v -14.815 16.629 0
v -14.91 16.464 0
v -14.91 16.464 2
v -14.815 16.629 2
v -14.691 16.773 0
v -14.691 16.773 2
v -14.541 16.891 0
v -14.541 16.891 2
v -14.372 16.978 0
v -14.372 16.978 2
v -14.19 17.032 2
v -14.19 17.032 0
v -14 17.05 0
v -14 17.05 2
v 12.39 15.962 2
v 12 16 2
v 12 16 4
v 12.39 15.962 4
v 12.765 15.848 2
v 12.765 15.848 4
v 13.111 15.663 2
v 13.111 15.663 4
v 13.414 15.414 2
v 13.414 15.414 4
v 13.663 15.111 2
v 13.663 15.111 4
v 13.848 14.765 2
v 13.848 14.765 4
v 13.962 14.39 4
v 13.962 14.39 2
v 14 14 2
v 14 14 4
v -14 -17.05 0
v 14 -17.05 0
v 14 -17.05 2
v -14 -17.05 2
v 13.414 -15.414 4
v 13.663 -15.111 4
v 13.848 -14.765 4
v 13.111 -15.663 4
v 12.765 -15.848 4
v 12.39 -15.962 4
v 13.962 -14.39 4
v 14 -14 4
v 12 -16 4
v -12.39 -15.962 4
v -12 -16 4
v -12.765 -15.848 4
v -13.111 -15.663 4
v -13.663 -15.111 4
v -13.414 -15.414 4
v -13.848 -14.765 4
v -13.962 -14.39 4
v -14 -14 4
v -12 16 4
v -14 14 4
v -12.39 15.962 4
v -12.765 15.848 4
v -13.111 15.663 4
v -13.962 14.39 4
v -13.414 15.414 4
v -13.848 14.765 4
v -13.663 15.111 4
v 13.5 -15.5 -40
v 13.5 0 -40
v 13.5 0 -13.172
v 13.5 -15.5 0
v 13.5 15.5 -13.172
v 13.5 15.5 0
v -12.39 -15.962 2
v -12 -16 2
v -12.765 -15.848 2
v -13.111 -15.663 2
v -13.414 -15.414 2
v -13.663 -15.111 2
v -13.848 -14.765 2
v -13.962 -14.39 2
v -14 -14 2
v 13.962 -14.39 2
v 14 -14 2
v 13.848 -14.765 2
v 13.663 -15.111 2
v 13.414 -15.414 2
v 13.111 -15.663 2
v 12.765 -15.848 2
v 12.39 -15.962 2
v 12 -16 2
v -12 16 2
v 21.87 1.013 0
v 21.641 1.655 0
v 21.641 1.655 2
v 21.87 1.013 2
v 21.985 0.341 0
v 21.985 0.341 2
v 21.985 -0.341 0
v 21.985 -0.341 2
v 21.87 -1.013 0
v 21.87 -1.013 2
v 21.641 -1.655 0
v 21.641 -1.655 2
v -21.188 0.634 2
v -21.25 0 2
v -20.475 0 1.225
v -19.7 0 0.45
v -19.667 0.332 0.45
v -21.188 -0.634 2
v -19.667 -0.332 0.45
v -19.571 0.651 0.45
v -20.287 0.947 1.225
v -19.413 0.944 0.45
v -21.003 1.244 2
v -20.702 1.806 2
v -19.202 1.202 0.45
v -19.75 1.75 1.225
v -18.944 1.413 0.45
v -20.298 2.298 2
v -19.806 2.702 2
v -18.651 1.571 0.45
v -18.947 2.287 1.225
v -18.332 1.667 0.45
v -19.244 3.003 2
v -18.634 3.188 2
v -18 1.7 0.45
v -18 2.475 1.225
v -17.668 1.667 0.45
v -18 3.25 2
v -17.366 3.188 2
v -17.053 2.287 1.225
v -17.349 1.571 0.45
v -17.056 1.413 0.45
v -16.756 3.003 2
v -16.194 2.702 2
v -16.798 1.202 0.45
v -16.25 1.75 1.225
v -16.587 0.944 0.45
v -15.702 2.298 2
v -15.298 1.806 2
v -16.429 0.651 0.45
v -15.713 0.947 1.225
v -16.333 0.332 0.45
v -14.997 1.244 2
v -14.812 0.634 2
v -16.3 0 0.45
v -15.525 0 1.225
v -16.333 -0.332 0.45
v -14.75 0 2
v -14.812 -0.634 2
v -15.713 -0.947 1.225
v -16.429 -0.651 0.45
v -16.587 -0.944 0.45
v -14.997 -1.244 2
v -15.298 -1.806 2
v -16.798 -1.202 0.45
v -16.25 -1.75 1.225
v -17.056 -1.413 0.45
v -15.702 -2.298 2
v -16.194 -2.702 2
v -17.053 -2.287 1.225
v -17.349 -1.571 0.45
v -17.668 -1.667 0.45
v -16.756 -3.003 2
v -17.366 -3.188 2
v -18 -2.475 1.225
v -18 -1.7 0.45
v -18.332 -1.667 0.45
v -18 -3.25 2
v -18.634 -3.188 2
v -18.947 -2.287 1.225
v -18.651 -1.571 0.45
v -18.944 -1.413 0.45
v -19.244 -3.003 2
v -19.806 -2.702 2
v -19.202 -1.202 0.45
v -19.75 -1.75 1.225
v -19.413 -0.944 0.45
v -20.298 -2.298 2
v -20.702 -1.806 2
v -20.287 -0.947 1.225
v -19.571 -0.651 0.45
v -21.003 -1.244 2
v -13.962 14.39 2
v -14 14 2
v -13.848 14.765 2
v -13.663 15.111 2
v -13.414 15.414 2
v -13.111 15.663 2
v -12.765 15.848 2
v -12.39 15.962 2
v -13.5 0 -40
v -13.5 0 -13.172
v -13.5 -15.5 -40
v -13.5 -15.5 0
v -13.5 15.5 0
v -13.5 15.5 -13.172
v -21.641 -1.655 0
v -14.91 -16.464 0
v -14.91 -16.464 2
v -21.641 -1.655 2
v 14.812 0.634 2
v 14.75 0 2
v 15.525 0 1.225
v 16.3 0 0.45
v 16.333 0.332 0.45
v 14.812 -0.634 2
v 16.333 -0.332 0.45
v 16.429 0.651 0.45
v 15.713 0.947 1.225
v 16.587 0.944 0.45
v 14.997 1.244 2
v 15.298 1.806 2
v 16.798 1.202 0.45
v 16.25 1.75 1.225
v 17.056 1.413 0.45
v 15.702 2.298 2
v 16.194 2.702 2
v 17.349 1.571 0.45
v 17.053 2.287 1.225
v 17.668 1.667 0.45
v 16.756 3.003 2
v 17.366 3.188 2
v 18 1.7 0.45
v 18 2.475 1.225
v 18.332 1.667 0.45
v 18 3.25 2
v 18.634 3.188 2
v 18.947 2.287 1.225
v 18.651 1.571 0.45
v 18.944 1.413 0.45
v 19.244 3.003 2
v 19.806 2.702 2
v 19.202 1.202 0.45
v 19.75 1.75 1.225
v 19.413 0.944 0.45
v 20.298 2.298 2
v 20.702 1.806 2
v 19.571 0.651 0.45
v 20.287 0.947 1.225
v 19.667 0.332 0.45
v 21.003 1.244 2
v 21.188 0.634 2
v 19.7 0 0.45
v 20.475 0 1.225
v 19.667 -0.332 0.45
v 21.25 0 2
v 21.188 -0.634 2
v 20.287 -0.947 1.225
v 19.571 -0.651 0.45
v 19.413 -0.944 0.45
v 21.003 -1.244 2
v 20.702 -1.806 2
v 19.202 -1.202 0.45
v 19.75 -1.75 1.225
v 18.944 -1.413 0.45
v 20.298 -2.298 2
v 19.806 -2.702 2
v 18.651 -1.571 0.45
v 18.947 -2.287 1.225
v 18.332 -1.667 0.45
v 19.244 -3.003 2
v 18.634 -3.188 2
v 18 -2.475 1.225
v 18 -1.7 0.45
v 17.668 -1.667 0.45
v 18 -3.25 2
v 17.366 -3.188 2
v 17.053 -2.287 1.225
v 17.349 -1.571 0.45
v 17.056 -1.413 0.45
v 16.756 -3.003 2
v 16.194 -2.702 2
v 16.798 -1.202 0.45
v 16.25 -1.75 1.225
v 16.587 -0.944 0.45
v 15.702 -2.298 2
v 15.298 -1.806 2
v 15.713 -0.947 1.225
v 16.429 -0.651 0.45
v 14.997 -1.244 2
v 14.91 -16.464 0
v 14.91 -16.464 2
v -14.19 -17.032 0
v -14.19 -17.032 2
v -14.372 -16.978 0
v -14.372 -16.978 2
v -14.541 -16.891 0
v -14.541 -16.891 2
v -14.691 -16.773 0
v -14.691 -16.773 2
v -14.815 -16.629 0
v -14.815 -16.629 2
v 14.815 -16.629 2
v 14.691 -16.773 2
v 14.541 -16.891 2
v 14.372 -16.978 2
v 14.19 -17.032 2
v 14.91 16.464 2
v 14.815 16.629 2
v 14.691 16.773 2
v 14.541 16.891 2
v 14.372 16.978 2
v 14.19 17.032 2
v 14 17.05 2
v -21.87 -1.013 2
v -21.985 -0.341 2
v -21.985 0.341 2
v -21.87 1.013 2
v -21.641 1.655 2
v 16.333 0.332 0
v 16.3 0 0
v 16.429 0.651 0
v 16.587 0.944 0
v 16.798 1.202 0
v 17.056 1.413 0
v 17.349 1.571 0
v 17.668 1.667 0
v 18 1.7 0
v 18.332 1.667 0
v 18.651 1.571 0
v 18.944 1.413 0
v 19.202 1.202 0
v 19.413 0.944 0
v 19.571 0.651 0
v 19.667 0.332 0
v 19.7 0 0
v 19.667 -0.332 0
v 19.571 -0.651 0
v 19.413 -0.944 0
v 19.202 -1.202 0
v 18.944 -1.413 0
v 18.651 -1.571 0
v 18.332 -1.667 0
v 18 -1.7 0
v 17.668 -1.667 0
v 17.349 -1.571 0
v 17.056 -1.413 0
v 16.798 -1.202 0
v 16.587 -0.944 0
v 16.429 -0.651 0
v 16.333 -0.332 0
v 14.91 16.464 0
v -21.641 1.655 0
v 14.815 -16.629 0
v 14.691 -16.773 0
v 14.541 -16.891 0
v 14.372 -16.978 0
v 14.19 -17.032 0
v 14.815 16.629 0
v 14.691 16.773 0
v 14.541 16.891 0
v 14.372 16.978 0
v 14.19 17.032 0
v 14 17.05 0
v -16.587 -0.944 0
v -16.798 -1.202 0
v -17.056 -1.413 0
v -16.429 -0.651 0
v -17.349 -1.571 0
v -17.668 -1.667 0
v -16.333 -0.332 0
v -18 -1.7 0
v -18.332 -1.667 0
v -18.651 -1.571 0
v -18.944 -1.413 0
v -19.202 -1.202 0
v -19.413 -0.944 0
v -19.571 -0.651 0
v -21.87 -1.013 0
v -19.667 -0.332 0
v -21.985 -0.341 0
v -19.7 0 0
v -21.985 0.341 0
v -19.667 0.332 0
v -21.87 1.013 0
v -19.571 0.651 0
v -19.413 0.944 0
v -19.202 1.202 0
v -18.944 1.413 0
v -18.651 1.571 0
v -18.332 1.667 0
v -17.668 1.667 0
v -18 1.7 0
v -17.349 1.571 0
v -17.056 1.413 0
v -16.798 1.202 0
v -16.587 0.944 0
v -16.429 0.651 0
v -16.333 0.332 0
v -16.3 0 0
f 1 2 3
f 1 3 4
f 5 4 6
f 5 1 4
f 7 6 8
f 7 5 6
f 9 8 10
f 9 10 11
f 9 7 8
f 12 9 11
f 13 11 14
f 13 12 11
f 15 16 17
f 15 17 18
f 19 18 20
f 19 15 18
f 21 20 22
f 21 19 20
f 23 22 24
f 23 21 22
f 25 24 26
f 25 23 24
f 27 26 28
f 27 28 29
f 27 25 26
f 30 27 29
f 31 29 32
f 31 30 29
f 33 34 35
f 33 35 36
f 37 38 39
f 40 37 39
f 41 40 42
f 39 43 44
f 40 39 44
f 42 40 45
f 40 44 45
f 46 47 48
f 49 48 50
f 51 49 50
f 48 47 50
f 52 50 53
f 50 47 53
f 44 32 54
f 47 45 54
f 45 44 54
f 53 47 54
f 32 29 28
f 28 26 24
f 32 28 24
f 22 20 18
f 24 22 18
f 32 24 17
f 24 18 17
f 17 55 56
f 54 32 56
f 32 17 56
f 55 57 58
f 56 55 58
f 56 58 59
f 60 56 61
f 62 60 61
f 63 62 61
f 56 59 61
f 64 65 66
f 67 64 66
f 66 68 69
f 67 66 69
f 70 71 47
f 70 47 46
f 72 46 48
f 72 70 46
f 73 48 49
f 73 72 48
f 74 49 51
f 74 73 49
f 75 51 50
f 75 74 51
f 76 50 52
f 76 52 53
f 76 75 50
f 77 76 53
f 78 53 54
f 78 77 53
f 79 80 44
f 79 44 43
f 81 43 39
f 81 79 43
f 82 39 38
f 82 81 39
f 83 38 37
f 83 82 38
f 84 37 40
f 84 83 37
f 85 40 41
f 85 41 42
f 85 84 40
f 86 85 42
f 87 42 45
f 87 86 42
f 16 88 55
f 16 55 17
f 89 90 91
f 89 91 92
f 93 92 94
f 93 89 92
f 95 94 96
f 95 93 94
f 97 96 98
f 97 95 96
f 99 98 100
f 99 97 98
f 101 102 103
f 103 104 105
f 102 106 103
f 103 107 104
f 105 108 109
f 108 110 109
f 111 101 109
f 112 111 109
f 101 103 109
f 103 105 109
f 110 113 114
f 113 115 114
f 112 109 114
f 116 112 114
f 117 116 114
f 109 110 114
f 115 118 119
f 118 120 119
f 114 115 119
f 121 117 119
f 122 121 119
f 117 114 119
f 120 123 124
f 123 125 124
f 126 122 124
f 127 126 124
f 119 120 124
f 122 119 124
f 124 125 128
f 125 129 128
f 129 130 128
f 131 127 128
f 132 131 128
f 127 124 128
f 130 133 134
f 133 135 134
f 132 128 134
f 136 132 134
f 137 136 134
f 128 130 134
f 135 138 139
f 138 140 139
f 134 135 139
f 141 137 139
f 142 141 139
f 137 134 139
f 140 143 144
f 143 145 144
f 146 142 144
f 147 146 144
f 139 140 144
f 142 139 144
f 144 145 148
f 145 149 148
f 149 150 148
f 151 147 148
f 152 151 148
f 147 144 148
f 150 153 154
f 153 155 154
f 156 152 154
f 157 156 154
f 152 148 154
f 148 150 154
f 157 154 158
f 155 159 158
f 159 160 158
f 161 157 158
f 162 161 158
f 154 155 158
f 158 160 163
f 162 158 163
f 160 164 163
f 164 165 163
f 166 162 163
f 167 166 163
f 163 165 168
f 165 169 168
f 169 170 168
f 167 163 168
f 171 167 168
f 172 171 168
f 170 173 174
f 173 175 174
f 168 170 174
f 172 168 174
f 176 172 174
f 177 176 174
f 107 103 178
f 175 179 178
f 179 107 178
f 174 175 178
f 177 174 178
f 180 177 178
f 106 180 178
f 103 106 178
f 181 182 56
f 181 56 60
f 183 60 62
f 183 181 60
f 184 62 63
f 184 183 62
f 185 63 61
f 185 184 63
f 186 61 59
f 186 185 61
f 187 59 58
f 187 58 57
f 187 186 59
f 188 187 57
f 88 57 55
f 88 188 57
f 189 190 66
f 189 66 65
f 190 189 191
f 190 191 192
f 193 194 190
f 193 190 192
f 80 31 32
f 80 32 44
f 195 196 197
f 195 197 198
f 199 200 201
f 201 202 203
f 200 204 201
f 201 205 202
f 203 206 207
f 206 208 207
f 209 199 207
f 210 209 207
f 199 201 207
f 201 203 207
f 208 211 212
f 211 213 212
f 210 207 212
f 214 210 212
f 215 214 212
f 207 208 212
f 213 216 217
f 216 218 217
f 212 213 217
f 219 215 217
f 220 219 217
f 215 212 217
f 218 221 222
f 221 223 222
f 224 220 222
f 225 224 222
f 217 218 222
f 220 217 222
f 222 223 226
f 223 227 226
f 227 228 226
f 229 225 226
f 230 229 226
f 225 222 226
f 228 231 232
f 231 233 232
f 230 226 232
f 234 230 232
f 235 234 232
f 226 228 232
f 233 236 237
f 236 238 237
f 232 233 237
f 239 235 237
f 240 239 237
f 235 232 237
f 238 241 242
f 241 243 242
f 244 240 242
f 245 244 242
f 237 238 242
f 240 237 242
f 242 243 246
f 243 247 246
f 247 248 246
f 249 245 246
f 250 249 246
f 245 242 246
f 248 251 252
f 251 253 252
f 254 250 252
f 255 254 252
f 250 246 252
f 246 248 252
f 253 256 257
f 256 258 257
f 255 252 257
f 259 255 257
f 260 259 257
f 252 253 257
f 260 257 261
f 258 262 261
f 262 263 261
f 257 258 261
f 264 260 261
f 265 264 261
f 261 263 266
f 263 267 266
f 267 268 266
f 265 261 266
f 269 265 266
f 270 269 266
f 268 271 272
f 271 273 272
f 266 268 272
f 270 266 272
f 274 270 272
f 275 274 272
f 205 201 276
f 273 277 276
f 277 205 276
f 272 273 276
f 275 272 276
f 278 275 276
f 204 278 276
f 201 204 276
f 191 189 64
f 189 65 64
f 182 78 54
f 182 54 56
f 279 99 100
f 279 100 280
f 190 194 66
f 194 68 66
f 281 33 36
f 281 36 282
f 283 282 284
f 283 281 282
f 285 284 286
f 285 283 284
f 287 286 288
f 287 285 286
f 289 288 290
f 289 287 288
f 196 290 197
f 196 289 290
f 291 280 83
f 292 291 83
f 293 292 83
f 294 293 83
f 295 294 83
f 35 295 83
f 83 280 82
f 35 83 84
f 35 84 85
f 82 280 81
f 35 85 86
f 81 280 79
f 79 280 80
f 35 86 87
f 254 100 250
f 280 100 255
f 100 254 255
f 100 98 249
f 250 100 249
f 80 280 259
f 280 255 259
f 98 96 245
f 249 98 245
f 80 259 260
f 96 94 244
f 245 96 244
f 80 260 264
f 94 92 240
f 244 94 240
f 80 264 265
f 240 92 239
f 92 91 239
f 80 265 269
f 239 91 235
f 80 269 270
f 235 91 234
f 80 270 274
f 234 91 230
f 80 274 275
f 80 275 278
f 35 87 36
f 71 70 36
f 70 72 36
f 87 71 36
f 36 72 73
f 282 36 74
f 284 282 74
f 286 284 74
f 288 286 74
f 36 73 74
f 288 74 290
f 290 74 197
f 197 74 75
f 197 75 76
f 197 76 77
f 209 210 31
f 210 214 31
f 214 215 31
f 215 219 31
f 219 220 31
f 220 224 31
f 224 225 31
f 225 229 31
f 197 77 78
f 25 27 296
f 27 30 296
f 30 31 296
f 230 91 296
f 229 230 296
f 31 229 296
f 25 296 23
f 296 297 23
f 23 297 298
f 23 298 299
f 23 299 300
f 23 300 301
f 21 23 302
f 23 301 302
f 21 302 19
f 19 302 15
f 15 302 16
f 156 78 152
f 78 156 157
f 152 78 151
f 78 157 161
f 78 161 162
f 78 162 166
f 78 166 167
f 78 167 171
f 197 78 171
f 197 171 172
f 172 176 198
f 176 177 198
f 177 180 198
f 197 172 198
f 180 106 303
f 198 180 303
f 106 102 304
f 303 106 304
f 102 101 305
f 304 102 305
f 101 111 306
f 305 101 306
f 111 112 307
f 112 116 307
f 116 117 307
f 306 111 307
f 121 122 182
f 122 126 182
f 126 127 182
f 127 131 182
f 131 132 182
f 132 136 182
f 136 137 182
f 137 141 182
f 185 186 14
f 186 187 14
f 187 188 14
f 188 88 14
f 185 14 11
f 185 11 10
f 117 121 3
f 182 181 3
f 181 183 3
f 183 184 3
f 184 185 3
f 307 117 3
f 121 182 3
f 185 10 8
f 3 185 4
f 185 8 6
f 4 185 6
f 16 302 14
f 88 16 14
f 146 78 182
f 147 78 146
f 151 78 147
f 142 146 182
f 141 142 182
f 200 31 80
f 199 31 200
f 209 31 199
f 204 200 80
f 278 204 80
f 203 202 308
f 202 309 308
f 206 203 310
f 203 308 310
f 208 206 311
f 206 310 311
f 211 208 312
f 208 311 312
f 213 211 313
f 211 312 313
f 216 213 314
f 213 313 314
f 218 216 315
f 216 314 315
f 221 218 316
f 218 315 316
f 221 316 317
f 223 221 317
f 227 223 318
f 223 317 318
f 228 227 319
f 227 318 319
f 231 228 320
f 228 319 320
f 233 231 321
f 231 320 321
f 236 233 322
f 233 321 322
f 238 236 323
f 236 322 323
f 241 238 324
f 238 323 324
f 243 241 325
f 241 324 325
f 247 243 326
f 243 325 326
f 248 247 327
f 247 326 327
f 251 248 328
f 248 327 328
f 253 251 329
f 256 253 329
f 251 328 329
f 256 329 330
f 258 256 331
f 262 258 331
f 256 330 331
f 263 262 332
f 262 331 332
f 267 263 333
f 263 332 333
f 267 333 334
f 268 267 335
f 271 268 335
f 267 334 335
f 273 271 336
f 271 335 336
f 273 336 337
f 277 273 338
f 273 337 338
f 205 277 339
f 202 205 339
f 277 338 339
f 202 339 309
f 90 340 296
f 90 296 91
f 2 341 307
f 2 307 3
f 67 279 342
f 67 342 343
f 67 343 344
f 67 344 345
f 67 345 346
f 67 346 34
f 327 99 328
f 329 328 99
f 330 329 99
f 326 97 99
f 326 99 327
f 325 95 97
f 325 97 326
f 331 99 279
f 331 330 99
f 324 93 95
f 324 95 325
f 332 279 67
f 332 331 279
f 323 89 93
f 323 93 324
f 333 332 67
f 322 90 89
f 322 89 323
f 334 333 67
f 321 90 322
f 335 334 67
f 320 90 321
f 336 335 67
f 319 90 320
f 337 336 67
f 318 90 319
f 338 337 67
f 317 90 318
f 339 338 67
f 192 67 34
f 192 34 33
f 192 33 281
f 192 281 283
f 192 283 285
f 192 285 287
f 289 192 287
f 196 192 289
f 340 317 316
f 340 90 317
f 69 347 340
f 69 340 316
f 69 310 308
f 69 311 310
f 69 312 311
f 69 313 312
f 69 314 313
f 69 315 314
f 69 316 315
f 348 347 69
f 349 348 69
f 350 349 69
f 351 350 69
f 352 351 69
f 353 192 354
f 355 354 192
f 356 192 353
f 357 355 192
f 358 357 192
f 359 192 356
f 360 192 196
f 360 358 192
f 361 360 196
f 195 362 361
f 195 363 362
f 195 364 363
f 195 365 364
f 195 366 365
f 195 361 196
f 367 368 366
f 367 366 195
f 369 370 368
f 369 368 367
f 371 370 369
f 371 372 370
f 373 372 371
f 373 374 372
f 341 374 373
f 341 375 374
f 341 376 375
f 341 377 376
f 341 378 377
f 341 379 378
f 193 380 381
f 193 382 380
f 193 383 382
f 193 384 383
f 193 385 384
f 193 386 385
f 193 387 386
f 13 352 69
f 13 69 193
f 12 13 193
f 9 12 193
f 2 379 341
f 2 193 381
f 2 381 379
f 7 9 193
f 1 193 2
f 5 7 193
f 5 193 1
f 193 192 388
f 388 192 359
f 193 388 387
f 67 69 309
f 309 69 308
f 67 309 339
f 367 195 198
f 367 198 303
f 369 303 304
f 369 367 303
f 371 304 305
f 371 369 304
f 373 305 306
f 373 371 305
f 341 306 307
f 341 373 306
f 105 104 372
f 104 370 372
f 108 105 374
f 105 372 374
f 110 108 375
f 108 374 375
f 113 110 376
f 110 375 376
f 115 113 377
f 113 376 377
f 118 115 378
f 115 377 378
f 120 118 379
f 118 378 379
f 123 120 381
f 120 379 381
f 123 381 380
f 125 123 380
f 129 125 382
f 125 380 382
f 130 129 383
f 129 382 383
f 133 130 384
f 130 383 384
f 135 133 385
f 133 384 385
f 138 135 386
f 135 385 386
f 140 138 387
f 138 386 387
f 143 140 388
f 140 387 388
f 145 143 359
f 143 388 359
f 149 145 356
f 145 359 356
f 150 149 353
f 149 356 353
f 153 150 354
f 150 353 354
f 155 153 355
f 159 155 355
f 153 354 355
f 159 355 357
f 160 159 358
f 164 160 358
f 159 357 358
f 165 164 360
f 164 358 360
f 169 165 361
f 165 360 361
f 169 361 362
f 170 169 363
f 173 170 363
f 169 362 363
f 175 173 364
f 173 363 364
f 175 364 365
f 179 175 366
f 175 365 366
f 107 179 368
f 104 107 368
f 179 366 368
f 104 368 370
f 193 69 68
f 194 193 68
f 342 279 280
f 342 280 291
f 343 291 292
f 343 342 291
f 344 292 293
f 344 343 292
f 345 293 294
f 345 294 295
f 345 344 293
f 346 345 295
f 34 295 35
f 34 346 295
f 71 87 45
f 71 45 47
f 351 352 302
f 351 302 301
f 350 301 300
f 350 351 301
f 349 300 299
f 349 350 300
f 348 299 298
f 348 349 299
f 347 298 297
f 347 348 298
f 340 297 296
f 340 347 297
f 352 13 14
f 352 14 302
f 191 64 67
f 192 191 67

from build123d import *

# Parameters (mm, degrees)
SKETCH1_R                                       = 1.5
BOSS_EXTRUDE1_DEPTH                             = 2
BOSS_EXTRUDE2_DEPTH                             = 2
BOSS_EXTRUDE3_DEPTH                             = 13.5
CSK_FOR_M3_FLAT_HEAD_MACHINE_SCREW1_D           = 3.4
CSK_FOR_M3_FLAT_HEAD_MACHINE_SCREW1_CSINK_D     = 6.5
CSK_FOR_M3_FLAT_HEAD_MACHINE_SCREW1_CSINK_ANGLE = 90


with BuildPart() as part:
    # Sketch1 → Boss-Extrude1 (new body)
    with BuildSketch(Plane.XY):
        with BuildLine():
            Line((-21.64147317, 1.655195806), (-14.910368292, 16.463798951))
            ThreePointArc((-14.910368292, 16.463798951), (-14.541387592, 16.890773142), (-14, 17.05))
            Line((-14, 17.05), (14, 17.05))
            ThreePointArc((14, 17.05), (14.541387592, 16.890773142), (14.910368292, 16.463798951))
            Line((14.910368292, 16.463798951), (21.64147317, 1.655195806))
            ThreePointArc((21.64147317, 1.655195806), (22, 0), (21.64147317, -1.655195806))
            Line((21.64147317, -1.655195806), (14.910368292, -16.463798951))
            ThreePointArc((14.910368292, -16.463798951), (14.541387592, -16.890773142), (14, -17.05))
            Line((14, -17.05), (-14, -17.05))
            ThreePointArc((-14, -17.05), (-14.541387592, -16.890773142), (-14.910368292, -16.463798951))
            Line((-14.910368292, -16.463798951), (-21.64147317, -1.655195806))
            ThreePointArc((-21.64147317, -1.655195806), (-22, 0), (-21.64147317, 1.655195806))
        make_face()
        with Locations((-18, 0)):
            Circle(SKETCH1_R, mode=Mode.SUBTRACT)
        with Locations((18, 0)):
            Circle(SKETCH1_R, mode=Mode.SUBTRACT)
    extrude(amount=BOSS_EXTRUDE1_DEPTH)

    # Sketch2 → Boss-Extrude2 (add)
    with BuildSketch(Plane.XY.offset(2)):
        with BuildLine():
            Line((-12, 16), (12, 16))
            ThreePointArc((12, 16), (13.414213562, 15.414213562), (14, 14))
            Line((14, 14), (14, -14))
            ThreePointArc((14, -14), (13.414213562, -15.414213562), (12, -16))
            Line((12, -16), (-12, -16))
            ThreePointArc((-12, -16), (-13.414213562, -15.414213562), (-14, -14))
            Line((-14, -14), (-14, 14))
            ThreePointArc((-14, 14), (-13.414213562, 15.414213562), (-12, 16))
        make_face()
    extrude(amount=BOSS_EXTRUDE2_DEPTH)

    # Sketch3 → Boss-Extrude3 (add, symmetric)
    with BuildSketch(Plane(origin=(0, 0, 0), x_dir=(0, 0, -1), z_dir=(1, 0, 0))):
        Polygon((0, 15.5), (13.171636249, 15.5), (13.171636249, 0), (40, 0), (40, -15.5), (0, -15.5), align=None)
    extrude(amount=BOSS_EXTRUDE3_DEPTH, both=True)

    # CSK for M3 Flat Head Machine Screw1 (through all)
    with Locations(Plane.XY.offset(2)):
        with Locations((-18, 0), (18, 0)):
            CounterSinkHole(CSK_FOR_M3_FLAT_HEAD_MACHINE_SCREW1_D / 2, CSK_FOR_M3_FLAT_HEAD_MACHINE_SCREW1_CSINK_D / 2, counter_sink_angle=CSK_FOR_M3_FLAT_HEAD_MACHINE_SCREW1_CSINK_ANGLE)


solid = part.part
